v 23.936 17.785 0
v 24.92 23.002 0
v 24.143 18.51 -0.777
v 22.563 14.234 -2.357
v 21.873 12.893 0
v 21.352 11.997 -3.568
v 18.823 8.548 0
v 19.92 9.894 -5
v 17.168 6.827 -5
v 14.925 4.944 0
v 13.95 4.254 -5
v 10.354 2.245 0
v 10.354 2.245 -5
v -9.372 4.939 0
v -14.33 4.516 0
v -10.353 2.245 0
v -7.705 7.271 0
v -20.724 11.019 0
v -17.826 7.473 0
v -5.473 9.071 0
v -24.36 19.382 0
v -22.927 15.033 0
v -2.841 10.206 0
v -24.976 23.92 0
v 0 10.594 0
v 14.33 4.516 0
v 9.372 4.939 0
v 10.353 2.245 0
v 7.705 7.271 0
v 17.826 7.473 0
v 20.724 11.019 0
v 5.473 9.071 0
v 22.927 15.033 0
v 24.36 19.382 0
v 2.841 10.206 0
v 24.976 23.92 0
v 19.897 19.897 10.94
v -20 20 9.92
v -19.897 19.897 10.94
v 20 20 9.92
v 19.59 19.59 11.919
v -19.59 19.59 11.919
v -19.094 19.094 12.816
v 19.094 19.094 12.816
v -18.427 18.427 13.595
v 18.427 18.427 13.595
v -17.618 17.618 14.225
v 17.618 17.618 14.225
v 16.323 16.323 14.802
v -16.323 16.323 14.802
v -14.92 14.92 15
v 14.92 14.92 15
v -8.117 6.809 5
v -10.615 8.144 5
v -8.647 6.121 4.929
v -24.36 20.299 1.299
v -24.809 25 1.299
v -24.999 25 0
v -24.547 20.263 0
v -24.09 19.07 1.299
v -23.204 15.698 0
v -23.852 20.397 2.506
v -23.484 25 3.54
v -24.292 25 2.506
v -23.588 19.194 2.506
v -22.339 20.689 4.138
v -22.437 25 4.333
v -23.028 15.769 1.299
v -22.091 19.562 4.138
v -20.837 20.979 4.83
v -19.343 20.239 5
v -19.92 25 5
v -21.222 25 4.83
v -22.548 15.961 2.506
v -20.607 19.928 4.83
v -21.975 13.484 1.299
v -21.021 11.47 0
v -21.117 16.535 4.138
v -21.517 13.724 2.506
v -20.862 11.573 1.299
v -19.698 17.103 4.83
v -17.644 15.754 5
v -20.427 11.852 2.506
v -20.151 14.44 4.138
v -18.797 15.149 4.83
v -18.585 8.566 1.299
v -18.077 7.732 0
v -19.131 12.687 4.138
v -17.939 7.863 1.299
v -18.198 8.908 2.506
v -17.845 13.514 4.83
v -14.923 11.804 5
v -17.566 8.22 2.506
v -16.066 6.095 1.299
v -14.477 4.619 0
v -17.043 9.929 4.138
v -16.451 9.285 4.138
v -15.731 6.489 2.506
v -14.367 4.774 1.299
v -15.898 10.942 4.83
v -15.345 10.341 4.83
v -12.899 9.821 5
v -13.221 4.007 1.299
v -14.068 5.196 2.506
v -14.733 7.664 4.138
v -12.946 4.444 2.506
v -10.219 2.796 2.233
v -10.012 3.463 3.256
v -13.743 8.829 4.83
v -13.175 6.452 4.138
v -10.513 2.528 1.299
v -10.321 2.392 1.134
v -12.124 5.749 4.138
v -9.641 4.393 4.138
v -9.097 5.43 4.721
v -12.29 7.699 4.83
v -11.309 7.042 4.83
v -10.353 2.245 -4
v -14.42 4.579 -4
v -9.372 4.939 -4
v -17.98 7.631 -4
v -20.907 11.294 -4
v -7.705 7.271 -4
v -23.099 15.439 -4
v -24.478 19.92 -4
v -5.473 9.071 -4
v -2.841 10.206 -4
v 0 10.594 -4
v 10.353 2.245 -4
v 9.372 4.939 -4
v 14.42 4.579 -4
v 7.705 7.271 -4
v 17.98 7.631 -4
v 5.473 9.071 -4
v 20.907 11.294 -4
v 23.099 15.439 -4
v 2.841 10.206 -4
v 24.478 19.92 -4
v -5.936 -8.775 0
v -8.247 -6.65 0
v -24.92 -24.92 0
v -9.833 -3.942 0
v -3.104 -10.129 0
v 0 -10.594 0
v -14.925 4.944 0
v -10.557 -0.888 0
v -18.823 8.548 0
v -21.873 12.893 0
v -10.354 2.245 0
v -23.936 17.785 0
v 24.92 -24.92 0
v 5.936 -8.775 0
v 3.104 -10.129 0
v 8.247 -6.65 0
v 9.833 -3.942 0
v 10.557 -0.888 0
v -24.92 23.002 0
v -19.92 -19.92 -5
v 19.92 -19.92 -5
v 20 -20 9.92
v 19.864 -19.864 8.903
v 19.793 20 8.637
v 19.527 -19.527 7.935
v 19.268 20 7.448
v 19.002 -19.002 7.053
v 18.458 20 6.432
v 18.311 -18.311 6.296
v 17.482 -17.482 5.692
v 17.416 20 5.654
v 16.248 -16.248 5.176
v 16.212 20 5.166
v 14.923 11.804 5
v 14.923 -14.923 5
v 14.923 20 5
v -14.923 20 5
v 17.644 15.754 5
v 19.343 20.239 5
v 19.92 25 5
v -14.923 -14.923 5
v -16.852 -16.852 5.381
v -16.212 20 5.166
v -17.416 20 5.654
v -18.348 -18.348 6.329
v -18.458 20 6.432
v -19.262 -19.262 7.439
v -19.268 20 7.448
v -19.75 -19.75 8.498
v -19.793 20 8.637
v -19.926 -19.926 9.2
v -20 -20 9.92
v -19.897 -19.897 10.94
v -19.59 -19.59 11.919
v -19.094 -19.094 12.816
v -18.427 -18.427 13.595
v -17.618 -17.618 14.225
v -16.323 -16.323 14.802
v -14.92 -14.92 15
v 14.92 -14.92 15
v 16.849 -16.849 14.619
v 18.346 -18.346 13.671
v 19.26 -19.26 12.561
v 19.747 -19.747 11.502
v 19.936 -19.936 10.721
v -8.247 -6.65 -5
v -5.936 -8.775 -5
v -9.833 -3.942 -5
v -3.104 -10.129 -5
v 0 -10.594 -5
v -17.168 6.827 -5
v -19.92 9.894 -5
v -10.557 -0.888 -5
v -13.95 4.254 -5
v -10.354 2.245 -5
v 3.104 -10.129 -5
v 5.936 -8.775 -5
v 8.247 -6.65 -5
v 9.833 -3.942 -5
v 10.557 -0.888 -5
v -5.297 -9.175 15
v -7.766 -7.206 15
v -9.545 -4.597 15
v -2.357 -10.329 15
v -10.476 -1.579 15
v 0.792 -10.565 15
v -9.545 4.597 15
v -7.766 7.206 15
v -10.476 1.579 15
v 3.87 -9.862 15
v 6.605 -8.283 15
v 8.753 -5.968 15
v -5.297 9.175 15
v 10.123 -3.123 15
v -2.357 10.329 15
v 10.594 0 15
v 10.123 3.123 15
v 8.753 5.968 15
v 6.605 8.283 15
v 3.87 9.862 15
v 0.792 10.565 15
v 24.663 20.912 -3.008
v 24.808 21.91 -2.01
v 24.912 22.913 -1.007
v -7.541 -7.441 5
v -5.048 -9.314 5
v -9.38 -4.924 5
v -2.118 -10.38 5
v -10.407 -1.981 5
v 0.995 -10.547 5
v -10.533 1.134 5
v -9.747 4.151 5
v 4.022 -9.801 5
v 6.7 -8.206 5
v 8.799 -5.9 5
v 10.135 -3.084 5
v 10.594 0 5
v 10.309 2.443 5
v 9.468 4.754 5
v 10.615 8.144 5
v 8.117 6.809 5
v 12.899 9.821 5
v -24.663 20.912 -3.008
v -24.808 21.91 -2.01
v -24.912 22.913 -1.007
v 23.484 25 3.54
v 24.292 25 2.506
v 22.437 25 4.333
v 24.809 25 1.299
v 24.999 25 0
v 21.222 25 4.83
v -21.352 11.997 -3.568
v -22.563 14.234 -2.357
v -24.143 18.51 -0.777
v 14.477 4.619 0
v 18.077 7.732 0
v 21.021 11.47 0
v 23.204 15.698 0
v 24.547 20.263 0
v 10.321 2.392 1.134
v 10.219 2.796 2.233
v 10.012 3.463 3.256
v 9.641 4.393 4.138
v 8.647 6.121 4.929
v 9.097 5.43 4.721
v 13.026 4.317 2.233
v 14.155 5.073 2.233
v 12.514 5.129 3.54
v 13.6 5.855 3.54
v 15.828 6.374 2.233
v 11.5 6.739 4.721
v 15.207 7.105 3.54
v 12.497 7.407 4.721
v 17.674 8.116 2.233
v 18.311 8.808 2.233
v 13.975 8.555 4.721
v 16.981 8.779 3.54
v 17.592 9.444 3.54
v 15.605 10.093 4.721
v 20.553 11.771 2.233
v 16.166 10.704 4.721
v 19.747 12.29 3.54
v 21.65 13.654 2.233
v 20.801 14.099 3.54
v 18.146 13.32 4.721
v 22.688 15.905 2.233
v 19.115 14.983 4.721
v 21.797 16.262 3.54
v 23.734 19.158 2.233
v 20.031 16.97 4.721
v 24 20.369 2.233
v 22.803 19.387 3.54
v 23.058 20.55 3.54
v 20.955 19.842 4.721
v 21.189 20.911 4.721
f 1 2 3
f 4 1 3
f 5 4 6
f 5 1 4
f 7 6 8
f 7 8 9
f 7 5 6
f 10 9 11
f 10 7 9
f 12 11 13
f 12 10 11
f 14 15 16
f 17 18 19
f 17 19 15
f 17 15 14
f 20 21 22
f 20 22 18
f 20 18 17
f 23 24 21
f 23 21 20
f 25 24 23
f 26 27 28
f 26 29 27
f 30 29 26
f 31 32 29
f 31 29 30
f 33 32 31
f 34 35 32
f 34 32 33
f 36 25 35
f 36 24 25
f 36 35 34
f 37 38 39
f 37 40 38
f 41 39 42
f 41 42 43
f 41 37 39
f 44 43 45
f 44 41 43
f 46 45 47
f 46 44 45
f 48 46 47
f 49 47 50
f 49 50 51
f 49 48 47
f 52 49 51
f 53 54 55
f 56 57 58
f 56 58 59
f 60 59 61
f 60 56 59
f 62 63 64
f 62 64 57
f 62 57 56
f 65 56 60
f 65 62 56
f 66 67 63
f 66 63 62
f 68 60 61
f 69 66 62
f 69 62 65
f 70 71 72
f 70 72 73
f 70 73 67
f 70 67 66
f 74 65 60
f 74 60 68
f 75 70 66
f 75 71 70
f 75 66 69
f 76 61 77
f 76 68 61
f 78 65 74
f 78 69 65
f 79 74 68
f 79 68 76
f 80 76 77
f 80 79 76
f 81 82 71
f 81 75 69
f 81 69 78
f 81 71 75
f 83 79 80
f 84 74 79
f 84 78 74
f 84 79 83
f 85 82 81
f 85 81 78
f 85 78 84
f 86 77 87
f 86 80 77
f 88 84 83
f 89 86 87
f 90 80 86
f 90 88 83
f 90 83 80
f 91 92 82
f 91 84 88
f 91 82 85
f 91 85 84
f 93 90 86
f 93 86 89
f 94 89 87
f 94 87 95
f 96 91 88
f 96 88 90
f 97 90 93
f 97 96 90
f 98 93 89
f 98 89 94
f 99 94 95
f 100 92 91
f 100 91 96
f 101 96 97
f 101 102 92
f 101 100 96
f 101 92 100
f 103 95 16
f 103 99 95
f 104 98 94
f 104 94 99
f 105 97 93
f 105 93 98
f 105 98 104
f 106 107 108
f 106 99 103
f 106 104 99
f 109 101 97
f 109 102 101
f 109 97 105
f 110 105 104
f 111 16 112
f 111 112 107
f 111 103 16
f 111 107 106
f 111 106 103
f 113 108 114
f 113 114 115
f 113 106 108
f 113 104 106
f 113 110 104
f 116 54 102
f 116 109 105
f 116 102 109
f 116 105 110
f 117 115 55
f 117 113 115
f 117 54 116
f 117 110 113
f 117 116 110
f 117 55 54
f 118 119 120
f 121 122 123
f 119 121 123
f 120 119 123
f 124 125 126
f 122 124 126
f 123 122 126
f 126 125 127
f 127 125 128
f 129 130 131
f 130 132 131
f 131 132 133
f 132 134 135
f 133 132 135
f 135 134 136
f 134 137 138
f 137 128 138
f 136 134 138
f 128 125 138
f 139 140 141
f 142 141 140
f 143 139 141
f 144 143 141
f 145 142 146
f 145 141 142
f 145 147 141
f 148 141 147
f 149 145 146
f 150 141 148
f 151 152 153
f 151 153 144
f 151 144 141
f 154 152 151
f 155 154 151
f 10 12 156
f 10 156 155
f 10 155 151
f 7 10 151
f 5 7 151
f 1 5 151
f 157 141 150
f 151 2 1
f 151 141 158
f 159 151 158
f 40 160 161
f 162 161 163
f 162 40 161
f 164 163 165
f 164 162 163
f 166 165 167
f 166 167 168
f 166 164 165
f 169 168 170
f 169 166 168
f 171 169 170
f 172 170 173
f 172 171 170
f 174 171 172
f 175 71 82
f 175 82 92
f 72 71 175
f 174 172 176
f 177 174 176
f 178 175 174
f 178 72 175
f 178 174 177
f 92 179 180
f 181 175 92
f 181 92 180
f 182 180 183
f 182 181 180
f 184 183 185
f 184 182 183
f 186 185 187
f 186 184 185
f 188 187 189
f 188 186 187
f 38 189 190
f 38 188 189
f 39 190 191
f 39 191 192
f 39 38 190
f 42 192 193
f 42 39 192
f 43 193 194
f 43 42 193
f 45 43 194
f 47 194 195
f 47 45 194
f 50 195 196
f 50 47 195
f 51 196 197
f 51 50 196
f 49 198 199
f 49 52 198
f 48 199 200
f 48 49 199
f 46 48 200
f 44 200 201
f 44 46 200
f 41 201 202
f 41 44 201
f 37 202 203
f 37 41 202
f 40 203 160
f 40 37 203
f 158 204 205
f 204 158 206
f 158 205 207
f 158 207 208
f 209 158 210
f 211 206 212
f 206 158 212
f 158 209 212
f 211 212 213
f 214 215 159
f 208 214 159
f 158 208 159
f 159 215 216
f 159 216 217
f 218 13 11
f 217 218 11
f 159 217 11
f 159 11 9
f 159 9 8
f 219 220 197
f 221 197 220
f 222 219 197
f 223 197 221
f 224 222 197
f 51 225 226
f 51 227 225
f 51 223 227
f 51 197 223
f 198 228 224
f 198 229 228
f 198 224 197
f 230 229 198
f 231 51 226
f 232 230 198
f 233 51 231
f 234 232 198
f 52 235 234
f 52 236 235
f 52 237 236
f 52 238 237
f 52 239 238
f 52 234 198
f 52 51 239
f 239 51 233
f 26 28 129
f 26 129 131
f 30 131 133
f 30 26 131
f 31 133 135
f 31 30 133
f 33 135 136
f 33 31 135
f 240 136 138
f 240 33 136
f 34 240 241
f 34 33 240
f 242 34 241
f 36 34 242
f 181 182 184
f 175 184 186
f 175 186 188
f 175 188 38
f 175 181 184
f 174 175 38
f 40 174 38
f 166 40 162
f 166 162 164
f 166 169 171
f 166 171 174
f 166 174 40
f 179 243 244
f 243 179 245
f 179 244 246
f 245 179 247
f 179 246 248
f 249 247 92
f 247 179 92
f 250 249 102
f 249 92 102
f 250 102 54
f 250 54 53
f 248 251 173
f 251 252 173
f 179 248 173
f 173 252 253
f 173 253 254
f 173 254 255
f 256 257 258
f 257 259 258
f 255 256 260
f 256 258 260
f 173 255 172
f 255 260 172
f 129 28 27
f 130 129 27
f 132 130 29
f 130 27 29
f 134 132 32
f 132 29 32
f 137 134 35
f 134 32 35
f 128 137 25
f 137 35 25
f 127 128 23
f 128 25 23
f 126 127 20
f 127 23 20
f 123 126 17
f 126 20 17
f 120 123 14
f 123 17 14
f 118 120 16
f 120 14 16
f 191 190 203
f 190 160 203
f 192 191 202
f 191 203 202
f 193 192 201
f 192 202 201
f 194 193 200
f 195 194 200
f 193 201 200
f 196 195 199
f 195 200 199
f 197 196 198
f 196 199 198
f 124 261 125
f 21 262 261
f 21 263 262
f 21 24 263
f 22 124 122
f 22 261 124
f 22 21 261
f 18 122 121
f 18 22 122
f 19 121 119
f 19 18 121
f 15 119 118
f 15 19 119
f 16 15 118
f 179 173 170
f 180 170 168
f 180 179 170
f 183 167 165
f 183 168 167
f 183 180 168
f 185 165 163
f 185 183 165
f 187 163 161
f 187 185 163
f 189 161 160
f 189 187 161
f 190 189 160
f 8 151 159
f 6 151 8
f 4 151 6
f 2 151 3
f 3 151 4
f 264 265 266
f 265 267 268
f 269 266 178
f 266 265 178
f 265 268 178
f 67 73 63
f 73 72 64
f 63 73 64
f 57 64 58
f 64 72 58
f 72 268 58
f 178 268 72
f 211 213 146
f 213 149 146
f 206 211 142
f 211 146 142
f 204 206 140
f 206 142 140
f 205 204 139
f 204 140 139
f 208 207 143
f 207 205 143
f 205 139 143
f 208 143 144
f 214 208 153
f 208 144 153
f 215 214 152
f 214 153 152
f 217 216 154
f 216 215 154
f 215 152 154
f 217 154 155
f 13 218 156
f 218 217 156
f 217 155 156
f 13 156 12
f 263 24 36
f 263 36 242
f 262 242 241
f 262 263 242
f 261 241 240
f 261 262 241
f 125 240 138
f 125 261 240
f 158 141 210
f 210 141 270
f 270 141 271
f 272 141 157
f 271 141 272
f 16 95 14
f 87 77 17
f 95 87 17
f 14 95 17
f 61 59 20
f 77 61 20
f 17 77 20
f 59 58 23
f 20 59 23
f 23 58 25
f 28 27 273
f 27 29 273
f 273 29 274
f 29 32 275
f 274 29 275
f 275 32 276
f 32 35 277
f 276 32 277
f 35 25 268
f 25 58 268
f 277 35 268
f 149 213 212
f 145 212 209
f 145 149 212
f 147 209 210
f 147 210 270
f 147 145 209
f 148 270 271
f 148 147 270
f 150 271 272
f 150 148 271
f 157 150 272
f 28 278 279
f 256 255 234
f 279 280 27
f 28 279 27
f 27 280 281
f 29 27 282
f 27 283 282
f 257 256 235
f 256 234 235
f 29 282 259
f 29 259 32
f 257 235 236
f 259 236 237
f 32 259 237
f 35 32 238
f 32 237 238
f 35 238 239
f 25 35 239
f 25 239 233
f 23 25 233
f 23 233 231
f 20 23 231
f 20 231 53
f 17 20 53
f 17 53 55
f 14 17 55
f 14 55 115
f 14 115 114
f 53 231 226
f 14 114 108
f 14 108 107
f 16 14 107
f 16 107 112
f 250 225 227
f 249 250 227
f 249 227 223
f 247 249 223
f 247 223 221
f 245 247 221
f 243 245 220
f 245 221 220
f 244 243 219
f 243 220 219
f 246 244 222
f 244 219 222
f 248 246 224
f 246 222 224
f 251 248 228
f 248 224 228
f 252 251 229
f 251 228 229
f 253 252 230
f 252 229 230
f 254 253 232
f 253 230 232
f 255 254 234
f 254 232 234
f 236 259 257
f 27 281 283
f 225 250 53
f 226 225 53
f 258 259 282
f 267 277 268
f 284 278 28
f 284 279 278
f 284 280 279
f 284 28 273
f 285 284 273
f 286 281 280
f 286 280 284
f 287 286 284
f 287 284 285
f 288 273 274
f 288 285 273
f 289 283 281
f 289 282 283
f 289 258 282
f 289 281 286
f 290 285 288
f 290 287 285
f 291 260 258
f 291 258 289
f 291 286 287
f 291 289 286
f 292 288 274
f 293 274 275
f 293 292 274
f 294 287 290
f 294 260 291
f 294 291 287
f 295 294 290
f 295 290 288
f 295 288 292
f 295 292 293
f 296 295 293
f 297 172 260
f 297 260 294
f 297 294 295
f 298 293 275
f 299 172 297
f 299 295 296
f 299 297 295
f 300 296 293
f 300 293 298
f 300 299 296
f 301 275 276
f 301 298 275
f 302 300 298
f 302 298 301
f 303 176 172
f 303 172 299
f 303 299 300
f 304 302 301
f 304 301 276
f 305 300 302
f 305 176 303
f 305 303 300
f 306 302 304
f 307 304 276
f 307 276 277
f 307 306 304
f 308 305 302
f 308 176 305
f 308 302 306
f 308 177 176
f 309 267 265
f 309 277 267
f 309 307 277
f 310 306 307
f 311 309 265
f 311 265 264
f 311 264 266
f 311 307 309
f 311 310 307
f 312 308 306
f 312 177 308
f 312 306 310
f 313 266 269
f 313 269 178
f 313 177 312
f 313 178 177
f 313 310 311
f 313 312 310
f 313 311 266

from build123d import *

# Parameters (mm, degrees)
F1_DEPTH      = 5
F2_DEPTH      = 5
F3_T2_ANGLE   = 238.3061287116
F4_DEPTH      = 4
F5_T1_DEPTH   = 85.2732038629
F5_T3_DEPTH   = 76.1282991577
F5_2_T1_DEPTH = 76.1270392372
F7_W          = 40
F7_H          = 40
F8_DEPTH      = 10
F9_R          = 5.08
F10_T1_DEPTH  = 65.3873984488
F10_T3_DEPTH  = 65.3873984488
F12_R         = 10.5941406936
F13_DEPTH     = 76.2


# Not quite as in the source:
# - a fillet or chamfer that OpenCascade refuses, or shapes differently, is made with other operations: its cross-section is extruded or revolved along the edge and cut away or added


with BuildPart() as f1:
    # F0 (on Top) → F1 (new body)
    with BuildSketch(Plane.XY):
        with BuildLine():
            Line((-25, -25), (25, -25))
            Line((25, -25), (25, 25))
            ThreePointArc((25, 25), (0, 0), (-25, 25))
            Line((-25, 25), (-25, -25))
        make_face()
    extrude(amount=-F1_DEPTH)

    # F5: chamfer of 5.08 on 3 edges, made by hand

    # F5_s2 → F5_t1 (cut)
    with BuildSketch(Plane.XZ.offset(-47.2090542841)):
        Polygon((-25, 0.08), (-19.92, -5), (-25, -5), align=None)
        Polygon((25, 0.08), (19.92, -5), (25, -5), align=None)
    extrude(amount=F5_T1_DEPTH, mode=Mode.SUBTRACT)

    # F5_s4 → F5_t3 (cut)
    with BuildSketch(Plane.YZ.offset(-38.0641495789)):
        Polygon((-25, 0.08), (-19.92, -5), (-25, -5), align=None)
    extrude(amount=F5_T3_DEPTH, mode=Mode.SUBTRACT)


with BuildPart() as f2:
    # F0 (on Top) → F2 (new body)
    with BuildSketch(Plane.XY):
        with BuildLine():
            ThreePointArc((-25, 25), (0, 0), (25, 25))
            Line((25, 25), (-25, 25))
        make_face()
    extrude(amount=F2_DEPTH)

    # F3: fillet of radius 5.08 on 1 edges, made by hand

    # F3_s1 → F3_t2 (revolve, cut)
    with BuildSketch(Plane(origin=(10.6358414033, 19.0672580005, 0), x_dir=(0, 0, 1), z_dir=(0.4871444139, 0.87332143, 0))):
        with BuildLine():
            ThreePointArc((-0.08, -37.1786103472), (3.5121024484, -35.6907127956), (5, -32.0986103472))
            Line((5, -32.0986103472), (5, -37.1786103472))
            Line((5, -37.1786103472), (-0.08, -37.1786103472))
        make_face()
    revolve(axis=Axis((0, 25, 5), (0, 0, 1)), revolution_arc=F3_T2_ANGLE, mode=Mode.SUBTRACT)


with BuildPart() as f4:
    # F4 (new): a face of the model
    f4_faces = [f2.part.faces().sort_by_distance(p)[0] for p in [
        (0, 14.389937824, 0),
    ]]
    extrude(f4_faces, amount=F4_DEPTH)

    # F5#2: chamfer of 5.08 on 1 edges, made by hand

    # F5_2_s2 → F5_2_t1 (cut)
    with BuildSketch(Plane.YZ.offset(-38.0635196186)):
        Polygon((25, 1.08), (19.92, -4), (25, -4), align=None)
    extrude(amount=F5_2_T1_DEPTH, mode=Mode.SUBTRACT)


with BuildPart() as f2_1:
    add(f2.part)

    # F7 (on offset) → F8 (join)
    with BuildSketch(Plane.XY.offset(5)):
        Rectangle(F7_W, F7_H)
    extrude(amount=F8_DEPTH)

    # F9
    f9_edges = [f2_1.edges().sort_by_distance(p)[0] for p in [
        (-20, 0, 15),
        (0, 20, 15),
        (20, 0, 15),
        (0, -20, 15),
    ]]
    fillet(f9_edges, radius=F9_R)

    # F10: fillet of radius 5.08 on 3 edges, made by hand

    # F10_s2 → F10_t1 (cut)
    with BuildSketch(Plane.XZ.offset(-32.6936992244)):
        with BuildLine():
            ThreePointArc((20, 9.92), (18.4576016389, 6.4317675513), (14.9225203102, 5))
            Line((14.9225203102, 5), (20, 5))
            Line((20, 5), (20, 9.92))
        make_face()
        with BuildLine():
            ThreePointArc((-14.9225203102, 5), (-18.4576016389, 6.4317675513), (-20, 9.92))
            Line((-20, 9.92), (-20, 5))
            Line((-20, 5), (-14.9225203102, 5))
        make_face()
    extrude(amount=F10_T1_DEPTH, mode=Mode.SUBTRACT)

    # F10_s4 → F10_t3 (cut)
    with BuildSketch(Plane.YZ.offset(-32.6936992244)):
        with BuildLine():
            ThreePointArc((-14.9225203102, 5), (-18.4576016389, 6.4317675513), (-20, 9.92))
            Line((-20, 9.92), (-20, 5))
            Line((-20, 5), (-14.9225203102, 5))
        make_face()
    extrude(amount=F10_T3_DEPTH, mode=Mode.SUBTRACT)


with BuildPart() as f13_tool:
    # F12 (on offset) → F13 (new body)
    with BuildSketch(Plane.XY.offset(15)):
        Circle(F12_R)
    extrude(amount=-F13_DEPTH)


with BuildPart() as f1_1:
    add(f1.part)

    # F13: cut by f13_tool
    add(f13_tool.part, mode=Mode.SUBTRACT)


with BuildPart() as f2_2:
    add(f2_1.part)

    # F13: cut by f13_tool
    add(f13_tool.part, mode=Mode.SUBTRACT)


with BuildPart() as f4_1:
    add(f4.part)

    # F13: cut by f13_tool
    add(f13_tool.part, mode=Mode.SUBTRACT)


solid = Compound([f1_1.part, f2_2.part, f4_1.part])
